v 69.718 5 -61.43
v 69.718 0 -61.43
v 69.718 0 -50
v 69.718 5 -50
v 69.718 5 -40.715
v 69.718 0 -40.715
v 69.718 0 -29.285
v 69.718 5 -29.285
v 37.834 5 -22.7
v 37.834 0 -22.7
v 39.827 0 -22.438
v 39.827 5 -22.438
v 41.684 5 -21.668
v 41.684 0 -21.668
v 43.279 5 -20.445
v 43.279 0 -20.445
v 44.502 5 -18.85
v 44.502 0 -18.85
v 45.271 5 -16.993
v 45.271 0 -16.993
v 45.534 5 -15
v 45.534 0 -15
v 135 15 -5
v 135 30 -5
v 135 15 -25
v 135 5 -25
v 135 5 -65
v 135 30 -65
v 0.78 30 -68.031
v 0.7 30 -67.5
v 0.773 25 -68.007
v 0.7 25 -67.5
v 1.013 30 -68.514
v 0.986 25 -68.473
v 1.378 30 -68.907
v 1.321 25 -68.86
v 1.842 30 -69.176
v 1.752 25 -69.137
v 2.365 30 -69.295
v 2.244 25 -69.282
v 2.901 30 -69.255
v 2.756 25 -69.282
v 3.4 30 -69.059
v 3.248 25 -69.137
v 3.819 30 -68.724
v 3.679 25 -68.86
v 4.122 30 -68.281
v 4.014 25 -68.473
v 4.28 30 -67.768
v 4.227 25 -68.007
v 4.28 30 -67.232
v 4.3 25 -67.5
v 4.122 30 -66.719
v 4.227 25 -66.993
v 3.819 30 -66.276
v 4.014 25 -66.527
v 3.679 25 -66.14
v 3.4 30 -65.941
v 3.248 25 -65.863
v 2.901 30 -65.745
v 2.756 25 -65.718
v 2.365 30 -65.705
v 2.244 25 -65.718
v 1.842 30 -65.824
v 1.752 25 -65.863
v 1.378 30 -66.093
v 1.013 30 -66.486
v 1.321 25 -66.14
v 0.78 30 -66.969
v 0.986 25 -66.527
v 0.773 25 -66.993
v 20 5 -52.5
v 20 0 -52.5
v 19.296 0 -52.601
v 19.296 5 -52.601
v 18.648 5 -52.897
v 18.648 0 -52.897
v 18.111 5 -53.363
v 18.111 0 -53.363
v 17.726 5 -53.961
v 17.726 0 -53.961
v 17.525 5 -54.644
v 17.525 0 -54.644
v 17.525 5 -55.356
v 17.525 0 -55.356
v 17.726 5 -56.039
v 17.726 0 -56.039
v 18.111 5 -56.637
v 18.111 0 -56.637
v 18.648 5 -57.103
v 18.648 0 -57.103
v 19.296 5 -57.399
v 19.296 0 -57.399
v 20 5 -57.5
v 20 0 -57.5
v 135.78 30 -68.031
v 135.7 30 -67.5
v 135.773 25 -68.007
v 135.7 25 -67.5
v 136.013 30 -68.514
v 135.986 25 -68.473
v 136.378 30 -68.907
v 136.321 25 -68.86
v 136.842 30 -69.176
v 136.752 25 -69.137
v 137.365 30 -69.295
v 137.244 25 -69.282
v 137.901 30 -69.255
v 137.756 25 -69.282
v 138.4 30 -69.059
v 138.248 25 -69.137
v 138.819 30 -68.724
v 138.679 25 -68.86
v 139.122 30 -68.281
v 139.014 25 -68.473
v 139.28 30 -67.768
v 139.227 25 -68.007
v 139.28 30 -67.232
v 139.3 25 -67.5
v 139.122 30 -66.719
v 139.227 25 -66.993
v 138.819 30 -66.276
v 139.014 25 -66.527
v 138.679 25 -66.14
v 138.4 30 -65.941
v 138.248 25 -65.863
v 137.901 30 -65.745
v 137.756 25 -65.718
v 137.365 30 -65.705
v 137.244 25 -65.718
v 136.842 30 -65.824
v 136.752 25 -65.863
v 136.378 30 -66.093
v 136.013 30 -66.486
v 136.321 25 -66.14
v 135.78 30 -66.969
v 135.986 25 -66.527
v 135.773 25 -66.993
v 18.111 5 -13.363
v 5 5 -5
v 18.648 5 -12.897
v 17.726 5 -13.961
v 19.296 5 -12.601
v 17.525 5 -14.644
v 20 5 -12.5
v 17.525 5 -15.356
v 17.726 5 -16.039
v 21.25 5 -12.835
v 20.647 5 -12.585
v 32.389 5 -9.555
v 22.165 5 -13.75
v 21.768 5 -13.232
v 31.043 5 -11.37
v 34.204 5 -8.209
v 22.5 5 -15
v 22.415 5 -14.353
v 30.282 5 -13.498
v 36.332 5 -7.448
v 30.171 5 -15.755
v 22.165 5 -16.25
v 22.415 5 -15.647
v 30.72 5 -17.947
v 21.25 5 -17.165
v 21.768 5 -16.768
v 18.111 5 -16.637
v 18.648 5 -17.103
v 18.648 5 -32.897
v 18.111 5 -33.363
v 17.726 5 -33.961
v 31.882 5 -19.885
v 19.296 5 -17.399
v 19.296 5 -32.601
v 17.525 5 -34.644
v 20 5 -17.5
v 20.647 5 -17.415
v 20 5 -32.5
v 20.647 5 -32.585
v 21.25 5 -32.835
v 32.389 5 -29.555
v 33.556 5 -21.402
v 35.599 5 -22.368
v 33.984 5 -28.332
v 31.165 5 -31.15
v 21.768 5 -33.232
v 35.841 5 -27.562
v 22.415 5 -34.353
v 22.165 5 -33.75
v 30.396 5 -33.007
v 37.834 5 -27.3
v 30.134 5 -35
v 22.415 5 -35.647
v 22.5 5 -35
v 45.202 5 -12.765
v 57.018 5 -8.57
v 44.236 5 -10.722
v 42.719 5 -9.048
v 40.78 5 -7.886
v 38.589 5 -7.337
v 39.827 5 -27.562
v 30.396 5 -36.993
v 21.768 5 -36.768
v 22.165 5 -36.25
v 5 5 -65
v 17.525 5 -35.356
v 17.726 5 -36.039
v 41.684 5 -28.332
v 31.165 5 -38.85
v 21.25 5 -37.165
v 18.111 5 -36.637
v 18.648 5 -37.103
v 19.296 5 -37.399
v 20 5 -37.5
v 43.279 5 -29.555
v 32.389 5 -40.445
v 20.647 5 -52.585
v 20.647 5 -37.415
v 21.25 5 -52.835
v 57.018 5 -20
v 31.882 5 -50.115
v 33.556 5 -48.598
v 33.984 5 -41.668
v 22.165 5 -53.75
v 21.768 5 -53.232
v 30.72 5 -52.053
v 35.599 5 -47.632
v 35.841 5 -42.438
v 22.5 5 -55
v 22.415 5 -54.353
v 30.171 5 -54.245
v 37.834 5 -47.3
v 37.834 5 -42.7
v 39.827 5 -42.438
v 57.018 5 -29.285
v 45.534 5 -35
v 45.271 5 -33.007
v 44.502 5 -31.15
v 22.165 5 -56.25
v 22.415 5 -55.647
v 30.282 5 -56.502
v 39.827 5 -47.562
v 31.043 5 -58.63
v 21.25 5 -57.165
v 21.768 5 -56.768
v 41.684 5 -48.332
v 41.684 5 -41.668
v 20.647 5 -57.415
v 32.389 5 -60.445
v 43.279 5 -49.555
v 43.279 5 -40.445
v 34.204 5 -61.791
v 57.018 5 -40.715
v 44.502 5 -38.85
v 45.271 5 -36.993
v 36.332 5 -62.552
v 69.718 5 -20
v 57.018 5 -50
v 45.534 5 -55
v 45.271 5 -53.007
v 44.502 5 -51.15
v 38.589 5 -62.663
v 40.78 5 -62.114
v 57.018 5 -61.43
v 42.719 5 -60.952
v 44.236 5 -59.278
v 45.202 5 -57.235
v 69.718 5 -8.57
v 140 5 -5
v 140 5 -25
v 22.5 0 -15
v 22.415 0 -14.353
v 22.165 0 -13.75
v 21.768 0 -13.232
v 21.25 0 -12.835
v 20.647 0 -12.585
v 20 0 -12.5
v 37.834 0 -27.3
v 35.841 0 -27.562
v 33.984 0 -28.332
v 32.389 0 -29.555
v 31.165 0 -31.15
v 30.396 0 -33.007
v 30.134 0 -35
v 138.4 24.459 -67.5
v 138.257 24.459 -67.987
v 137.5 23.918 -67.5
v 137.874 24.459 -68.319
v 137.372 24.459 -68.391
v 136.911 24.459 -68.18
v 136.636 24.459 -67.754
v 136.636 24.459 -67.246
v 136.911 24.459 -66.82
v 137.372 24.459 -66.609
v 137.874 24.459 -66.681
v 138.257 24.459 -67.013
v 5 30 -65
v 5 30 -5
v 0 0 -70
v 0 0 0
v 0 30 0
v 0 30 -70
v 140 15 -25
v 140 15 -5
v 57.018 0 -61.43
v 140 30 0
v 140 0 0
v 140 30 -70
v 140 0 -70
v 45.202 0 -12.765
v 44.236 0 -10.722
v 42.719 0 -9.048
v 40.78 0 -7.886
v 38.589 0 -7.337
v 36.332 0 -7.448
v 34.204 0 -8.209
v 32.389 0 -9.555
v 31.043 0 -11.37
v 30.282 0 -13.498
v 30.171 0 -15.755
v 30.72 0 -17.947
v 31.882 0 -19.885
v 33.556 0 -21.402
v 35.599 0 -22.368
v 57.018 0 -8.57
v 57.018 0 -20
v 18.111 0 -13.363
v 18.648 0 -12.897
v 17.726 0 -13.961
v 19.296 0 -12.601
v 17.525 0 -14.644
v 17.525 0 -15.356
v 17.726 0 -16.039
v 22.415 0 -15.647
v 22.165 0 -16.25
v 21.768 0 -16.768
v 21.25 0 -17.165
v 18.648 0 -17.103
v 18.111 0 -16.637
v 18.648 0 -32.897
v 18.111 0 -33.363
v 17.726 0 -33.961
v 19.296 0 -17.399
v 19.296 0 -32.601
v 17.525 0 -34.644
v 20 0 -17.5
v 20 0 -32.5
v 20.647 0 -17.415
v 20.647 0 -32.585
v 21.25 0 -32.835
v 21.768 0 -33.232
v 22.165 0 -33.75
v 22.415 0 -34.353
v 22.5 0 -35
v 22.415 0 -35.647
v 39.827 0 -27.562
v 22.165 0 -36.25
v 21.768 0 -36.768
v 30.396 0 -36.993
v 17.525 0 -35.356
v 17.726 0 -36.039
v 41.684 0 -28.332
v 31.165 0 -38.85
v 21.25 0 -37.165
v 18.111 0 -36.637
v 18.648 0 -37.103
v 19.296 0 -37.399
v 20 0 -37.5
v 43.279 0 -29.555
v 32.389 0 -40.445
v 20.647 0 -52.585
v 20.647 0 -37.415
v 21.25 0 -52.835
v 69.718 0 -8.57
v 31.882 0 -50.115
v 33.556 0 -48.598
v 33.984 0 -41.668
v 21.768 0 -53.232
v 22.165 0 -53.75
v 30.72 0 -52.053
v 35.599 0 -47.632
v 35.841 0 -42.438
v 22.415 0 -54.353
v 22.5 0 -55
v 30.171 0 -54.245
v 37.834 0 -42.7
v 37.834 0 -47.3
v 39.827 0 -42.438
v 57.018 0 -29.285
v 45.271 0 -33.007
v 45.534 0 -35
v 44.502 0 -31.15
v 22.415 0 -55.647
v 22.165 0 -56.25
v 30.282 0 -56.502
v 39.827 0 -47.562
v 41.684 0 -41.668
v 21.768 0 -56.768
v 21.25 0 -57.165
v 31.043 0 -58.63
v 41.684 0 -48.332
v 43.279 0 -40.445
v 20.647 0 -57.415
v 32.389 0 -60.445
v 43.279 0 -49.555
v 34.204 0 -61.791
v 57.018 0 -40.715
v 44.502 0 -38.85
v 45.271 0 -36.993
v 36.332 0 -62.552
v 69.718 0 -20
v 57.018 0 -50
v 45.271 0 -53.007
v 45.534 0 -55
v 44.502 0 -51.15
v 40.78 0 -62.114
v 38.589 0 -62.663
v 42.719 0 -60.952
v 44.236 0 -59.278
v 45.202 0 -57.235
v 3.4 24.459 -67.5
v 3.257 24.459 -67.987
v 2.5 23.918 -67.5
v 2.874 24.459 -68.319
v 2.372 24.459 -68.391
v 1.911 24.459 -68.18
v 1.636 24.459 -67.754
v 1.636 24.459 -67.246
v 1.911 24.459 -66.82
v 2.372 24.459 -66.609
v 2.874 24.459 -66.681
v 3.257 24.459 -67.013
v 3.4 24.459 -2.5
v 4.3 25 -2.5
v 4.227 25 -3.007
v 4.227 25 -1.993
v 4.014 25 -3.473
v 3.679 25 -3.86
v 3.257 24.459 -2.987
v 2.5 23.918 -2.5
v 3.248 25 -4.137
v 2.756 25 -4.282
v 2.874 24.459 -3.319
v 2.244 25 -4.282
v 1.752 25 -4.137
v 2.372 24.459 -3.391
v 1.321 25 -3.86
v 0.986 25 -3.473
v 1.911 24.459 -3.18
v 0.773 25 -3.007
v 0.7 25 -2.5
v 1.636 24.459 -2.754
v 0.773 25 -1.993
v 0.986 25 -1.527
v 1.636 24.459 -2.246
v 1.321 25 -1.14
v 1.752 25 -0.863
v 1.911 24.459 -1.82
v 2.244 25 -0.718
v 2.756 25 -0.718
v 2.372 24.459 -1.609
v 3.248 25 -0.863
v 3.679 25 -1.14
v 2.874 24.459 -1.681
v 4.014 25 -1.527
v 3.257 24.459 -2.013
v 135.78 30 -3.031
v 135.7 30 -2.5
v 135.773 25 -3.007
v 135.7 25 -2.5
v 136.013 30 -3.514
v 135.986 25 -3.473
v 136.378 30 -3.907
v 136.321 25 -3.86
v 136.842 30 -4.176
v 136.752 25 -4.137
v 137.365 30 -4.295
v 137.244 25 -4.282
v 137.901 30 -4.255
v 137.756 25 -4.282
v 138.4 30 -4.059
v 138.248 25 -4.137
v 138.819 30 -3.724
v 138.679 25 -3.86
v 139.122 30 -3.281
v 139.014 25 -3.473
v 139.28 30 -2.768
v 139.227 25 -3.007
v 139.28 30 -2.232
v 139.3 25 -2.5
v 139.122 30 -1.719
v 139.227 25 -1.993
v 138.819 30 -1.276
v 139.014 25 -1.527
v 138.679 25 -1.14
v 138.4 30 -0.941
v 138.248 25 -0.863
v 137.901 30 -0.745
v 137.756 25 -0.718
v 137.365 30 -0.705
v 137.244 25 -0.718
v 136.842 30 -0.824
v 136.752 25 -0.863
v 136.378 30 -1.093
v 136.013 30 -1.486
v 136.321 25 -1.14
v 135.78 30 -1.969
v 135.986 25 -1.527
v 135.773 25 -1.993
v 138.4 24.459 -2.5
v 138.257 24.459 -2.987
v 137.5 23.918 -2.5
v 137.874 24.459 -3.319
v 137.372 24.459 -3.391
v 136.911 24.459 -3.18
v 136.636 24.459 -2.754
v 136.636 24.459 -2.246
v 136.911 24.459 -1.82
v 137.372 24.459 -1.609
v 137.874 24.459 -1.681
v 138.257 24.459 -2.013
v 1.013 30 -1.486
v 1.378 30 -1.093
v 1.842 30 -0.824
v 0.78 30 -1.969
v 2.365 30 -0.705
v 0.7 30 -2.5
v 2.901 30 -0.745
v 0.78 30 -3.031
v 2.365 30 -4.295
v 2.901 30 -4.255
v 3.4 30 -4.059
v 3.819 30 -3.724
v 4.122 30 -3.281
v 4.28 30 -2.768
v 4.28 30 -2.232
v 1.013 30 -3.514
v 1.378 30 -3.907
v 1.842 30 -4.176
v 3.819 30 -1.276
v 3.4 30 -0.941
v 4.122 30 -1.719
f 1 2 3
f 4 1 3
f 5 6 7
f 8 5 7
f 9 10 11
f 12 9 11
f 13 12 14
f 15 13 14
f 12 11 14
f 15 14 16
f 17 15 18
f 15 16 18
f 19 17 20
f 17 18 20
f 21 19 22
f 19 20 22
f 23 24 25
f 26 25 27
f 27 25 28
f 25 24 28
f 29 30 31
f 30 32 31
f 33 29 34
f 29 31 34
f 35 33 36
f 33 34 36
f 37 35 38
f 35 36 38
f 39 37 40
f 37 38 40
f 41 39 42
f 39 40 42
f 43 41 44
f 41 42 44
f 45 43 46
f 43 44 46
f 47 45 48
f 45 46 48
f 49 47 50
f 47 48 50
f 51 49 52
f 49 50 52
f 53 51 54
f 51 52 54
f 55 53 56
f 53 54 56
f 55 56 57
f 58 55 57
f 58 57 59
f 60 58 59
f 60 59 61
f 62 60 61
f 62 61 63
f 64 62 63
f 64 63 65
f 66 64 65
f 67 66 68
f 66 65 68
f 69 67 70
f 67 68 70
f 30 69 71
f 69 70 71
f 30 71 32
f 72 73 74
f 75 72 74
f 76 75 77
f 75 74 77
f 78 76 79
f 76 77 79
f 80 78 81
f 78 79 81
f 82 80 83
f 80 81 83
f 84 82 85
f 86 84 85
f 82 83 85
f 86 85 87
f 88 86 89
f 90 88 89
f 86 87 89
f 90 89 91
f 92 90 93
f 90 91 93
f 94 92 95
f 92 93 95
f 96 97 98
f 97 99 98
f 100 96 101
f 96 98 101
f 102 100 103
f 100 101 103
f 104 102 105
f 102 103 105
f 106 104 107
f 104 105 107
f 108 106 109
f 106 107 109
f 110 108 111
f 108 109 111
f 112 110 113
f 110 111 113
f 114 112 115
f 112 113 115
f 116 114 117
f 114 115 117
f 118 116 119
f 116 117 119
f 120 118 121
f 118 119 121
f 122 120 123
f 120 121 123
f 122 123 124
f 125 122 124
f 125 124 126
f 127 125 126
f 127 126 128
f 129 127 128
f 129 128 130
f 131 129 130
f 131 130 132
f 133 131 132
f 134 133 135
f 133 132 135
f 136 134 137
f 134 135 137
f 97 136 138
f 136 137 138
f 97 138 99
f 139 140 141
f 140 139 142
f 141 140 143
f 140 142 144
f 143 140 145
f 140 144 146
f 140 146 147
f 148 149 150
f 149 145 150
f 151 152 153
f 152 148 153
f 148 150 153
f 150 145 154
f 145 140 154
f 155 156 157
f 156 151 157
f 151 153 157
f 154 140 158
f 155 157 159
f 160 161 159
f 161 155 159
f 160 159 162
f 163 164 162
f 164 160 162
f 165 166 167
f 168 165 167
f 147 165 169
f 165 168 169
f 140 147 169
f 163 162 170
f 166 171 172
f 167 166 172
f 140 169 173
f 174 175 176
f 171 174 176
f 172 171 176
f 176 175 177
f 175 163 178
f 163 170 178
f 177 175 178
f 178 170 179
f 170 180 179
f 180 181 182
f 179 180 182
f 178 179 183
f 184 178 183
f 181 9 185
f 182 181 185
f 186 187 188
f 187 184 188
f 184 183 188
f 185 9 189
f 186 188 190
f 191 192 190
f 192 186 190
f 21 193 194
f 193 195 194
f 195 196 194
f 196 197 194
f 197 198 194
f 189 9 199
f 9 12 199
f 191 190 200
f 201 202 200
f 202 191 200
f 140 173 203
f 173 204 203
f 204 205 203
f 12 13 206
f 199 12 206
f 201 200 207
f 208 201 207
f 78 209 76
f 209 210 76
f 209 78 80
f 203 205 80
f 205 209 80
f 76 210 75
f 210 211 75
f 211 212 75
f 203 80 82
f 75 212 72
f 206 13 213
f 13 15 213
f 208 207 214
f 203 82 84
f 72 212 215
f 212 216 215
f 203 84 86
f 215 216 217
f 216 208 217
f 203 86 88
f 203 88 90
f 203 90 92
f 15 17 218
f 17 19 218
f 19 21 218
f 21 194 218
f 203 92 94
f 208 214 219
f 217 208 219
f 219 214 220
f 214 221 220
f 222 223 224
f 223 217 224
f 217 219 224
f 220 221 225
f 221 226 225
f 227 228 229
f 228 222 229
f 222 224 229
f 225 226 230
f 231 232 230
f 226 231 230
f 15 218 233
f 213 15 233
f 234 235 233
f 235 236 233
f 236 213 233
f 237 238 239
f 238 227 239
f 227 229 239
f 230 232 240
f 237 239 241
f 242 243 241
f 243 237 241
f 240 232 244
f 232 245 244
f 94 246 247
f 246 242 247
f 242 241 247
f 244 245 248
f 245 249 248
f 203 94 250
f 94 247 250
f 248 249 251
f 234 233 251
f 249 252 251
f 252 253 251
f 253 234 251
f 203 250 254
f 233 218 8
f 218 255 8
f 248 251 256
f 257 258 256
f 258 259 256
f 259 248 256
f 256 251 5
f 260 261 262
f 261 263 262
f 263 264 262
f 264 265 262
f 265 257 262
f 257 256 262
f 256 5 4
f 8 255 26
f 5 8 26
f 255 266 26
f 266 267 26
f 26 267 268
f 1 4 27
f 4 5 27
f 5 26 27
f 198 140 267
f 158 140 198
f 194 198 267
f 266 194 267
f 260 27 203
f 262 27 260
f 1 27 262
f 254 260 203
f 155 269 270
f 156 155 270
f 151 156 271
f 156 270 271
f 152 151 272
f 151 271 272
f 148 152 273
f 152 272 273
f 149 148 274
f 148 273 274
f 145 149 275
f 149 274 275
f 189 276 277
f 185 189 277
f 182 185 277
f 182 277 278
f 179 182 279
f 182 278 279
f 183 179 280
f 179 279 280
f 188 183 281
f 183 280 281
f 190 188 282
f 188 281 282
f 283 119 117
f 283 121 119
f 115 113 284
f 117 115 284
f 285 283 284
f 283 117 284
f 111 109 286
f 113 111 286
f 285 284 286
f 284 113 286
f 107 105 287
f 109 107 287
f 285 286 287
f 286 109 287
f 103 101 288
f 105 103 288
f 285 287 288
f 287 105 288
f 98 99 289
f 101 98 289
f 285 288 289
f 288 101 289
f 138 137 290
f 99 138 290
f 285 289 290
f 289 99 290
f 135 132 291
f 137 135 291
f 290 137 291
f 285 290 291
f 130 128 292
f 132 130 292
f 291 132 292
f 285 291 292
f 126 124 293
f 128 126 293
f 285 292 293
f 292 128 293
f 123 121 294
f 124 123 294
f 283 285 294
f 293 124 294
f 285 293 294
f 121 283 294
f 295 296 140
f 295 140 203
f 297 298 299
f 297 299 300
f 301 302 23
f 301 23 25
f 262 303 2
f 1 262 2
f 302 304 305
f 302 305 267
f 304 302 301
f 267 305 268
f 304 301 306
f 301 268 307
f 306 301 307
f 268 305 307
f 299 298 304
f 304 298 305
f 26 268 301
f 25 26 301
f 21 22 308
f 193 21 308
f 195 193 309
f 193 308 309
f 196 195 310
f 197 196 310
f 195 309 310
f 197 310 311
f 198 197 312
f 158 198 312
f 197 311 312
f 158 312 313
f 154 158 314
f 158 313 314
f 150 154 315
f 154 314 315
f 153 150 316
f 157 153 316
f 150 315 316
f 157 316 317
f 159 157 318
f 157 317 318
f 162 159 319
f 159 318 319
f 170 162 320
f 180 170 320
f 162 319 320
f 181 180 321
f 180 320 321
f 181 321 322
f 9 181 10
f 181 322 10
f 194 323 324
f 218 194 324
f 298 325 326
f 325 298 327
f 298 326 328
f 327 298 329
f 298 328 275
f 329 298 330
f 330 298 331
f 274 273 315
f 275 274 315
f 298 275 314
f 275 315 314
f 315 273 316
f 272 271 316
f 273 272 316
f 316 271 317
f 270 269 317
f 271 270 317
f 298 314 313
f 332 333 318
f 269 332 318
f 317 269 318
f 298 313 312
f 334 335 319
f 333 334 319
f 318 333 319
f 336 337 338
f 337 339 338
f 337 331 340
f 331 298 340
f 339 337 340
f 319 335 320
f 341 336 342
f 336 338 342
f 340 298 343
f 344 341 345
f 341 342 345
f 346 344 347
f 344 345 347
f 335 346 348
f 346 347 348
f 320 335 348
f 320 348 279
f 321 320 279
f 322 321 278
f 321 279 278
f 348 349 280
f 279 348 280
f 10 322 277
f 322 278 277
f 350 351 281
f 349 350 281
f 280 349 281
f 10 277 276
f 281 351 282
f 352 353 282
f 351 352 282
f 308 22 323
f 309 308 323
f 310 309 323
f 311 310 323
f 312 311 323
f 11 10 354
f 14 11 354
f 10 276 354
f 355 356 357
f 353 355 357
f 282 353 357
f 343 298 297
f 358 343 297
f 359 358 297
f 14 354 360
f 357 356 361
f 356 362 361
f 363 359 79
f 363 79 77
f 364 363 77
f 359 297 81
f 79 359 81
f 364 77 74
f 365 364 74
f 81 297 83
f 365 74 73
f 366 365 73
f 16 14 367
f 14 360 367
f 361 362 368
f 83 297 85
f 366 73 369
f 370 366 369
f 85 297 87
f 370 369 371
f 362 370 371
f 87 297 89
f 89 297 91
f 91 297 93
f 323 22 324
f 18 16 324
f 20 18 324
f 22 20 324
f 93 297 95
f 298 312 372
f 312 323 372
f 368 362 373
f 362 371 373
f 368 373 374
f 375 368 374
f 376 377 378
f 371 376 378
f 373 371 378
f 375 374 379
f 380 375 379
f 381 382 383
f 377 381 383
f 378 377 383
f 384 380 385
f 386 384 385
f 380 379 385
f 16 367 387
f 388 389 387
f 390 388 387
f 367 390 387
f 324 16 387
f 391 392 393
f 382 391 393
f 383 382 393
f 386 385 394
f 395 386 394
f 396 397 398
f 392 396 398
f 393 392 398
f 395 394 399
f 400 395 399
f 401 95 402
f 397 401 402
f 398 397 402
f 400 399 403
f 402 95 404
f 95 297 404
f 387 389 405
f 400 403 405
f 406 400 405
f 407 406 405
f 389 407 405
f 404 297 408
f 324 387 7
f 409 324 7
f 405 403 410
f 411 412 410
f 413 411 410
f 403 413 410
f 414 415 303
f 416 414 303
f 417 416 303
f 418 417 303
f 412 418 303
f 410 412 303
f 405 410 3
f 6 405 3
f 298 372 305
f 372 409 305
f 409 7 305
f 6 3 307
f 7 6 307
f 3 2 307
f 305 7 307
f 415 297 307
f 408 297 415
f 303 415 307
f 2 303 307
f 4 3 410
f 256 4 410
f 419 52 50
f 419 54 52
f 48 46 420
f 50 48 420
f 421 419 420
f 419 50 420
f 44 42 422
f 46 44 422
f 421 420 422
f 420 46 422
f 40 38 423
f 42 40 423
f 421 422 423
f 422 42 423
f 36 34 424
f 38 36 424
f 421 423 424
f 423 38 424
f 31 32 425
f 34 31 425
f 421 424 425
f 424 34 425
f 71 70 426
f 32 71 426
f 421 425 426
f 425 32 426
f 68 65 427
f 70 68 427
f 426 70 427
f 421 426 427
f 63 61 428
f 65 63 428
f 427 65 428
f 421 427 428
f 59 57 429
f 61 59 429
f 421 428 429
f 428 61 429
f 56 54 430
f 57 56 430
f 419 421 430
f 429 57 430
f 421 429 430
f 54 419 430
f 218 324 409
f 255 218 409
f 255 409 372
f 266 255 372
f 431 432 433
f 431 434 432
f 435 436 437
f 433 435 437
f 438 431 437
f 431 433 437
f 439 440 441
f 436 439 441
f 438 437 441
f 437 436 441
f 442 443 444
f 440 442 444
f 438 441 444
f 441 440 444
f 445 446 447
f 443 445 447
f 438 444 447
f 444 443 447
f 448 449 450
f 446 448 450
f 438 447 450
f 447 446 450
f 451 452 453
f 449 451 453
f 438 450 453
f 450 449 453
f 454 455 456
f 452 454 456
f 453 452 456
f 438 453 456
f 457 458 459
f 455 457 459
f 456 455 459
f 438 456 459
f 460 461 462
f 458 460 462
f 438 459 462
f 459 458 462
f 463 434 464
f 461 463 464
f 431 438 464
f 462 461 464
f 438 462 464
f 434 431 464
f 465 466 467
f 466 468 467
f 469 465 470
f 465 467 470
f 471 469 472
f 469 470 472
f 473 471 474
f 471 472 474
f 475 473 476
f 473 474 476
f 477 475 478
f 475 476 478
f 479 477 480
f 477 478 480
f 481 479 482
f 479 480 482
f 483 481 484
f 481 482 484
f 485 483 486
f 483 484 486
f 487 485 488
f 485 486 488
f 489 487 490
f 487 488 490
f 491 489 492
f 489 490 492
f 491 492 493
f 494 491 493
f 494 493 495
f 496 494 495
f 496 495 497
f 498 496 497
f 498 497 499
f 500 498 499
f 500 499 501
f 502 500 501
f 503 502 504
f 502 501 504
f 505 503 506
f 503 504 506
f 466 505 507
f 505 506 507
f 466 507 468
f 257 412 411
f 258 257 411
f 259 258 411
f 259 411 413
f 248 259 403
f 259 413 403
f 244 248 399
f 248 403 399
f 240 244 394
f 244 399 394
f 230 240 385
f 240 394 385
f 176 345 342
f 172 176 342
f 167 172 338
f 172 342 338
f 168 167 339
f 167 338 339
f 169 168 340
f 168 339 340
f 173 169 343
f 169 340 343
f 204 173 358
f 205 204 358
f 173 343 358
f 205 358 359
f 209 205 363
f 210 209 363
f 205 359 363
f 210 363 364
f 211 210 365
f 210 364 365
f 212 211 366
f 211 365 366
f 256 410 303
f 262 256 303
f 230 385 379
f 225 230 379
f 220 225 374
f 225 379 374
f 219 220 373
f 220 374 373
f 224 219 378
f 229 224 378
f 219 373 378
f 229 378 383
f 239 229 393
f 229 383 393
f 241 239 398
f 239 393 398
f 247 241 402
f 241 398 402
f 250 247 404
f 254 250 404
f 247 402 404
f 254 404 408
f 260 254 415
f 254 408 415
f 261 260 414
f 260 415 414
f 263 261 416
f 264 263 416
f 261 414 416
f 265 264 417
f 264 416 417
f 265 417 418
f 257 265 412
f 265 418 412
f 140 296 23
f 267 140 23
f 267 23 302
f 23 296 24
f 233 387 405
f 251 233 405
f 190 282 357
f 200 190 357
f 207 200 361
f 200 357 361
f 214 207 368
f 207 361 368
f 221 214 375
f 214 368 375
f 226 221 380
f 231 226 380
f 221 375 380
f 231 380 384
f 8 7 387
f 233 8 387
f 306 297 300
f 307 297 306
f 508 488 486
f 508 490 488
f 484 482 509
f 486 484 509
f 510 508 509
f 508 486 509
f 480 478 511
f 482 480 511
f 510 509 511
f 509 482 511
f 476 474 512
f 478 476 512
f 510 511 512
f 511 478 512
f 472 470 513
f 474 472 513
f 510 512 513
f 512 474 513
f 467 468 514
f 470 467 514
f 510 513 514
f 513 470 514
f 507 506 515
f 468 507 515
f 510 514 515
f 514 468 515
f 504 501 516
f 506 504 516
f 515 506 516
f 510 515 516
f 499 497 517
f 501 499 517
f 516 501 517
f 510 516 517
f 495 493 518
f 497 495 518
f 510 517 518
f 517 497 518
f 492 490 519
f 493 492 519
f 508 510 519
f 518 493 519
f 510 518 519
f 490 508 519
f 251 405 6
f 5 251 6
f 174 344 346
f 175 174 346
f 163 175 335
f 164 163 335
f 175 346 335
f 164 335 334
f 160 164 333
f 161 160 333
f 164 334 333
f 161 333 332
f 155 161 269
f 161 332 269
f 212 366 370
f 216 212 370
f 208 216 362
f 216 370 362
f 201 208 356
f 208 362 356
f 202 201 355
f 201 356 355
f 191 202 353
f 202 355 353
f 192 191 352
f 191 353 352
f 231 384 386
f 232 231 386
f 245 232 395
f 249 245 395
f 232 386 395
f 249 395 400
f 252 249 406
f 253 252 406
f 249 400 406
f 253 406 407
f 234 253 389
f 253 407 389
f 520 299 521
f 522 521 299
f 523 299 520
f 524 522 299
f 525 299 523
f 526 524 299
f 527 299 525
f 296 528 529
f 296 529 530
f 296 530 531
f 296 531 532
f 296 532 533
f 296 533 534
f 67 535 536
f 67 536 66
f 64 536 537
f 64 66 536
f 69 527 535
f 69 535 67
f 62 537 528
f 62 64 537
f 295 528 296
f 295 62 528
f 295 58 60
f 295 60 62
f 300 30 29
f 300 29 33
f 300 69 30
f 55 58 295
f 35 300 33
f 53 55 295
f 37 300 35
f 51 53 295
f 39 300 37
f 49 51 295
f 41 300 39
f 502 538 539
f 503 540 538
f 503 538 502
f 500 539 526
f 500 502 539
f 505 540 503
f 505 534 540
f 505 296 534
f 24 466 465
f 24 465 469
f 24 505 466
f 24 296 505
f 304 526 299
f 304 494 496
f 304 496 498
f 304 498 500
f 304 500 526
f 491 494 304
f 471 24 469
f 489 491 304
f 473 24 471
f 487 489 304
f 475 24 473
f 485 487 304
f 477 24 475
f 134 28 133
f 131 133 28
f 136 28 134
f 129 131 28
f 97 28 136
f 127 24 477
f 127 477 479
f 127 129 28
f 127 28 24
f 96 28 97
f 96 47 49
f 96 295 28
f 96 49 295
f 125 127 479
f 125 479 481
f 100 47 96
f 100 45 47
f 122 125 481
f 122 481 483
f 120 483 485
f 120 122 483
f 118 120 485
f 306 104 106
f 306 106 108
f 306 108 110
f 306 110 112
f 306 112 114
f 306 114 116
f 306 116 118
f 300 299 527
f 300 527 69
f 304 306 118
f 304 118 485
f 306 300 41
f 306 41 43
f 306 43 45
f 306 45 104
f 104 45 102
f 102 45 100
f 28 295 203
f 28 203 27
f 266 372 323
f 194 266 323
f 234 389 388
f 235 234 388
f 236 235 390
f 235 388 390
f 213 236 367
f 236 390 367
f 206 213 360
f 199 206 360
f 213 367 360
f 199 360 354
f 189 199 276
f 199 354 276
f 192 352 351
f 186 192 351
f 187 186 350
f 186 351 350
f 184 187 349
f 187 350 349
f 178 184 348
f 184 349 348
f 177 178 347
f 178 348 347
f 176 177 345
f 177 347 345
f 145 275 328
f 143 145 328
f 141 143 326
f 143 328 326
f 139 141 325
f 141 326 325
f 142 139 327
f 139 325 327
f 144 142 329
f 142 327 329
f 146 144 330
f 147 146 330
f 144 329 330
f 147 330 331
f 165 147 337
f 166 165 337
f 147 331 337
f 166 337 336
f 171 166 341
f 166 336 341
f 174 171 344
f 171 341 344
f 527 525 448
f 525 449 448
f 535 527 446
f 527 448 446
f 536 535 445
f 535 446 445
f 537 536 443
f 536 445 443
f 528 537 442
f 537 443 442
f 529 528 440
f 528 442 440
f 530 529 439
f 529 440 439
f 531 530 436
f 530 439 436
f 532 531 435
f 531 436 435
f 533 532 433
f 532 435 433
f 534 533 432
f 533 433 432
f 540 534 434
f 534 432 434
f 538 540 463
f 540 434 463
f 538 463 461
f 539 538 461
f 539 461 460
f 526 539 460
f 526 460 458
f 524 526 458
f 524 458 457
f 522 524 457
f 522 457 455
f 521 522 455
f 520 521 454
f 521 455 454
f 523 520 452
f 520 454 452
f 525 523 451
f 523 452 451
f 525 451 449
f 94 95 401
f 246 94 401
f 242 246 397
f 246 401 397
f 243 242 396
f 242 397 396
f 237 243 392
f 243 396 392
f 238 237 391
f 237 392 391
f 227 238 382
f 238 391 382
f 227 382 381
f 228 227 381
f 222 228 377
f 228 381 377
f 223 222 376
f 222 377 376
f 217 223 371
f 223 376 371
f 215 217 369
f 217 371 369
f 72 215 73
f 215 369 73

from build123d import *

# Parameters (mm, degrees)
SKETCH1_W                = 140
SKETCH1_H                = 70
BOSS_EXTRUDE1_DEPTH      = 30
SKETCH2_W                = 130
SKETCH2_H                = 60
CUT_EXTRUDE1_DEPTH       = 25
SKETCH3_W                = 5
SKETCH3_H                = 5.715
CUT_EXTRUDE2_DEPTH       = 25
SKETCH4_W                = 20
SKETCH4_H                = 10
CUT_EXTRUDE6_DEPTH       = 25
M3_CLEARANCE_HOLE1_D     = 3.6
M3_CLEARANCE_HOLE1_DEPTH = 5
M3_CLEARANCE_HOLE1_TIP   = 1.081549114


with BuildPart() as part:
    # Sketch1 → Boss-Extrude1 (new body)
    with BuildSketch(Plane(origin=(0, 0, 0), x_dir=(1, 0, 0), z_dir=(0, 1, 0))):
        with Locations((70, 35)):
            Rectangle(SKETCH1_W, SKETCH1_H)
    extrude(amount=BOSS_EXTRUDE1_DEPTH)

    # Sketch2 → Cut-Extrude1 (cut)
    with BuildSketch(Plane(origin=(0, 30, 0), x_dir=(1, 0, 0), z_dir=(0, 1, 0))):
        with Locations((70, 35)):
            Rectangle(SKETCH2_W, SKETCH2_H)
    extrude(amount=-CUT_EXTRUDE1_DEPTH, mode=Mode.SUBTRACT)

    # Sketch3 → Cut-Extrude2 (cut)
    with BuildSketch(Plane.XZ):
        with BuildLine():
            ThreePointArc((22.5, -15), (21.767766953, -13.232233047), (20, -12.5))
            Line((20, -12.5), (20, -15))
            Line((20, -15), (20, -17.5))
            ThreePointArc((20, -17.5), (21.767766953, -16.767766953), (22.5, -15))
        make_face()
        with BuildLine():
            ThreePointArc((45.533822472, -15), (32.389100257, -9.555277785), (37.833822472, -22.7))
            ThreePointArc((37.833822472, -22.7), (43.278544687, -20.444722215), (45.533822472, -15))
        make_face()
        Polygon((57.017644944, -20), (62.017644944, -20), (69.717644944, -20), (69.717644944, -8.57), (57.017644944, -8.57), (57.017644944, -15), align=None)
        Polygon((69.717644944, -50), (62.017644944, -50), (57.017644944, -50), (57.017644944, -61.43), (69.717644944, -61.43), align=None)
        with Locations((59.517644944, -32.1425)):
            Rectangle(SKETCH3_W, SKETCH3_H)
        with Locations((59.517644944, -37.8575)):
            Rectangle(SKETCH3_W, SKETCH3_H)
        with BuildLine():
            ThreePointArc((45.533822472, -55), (43.278544687, -49.555277785), (37.833822472, -47.3))
            ThreePointArc((37.833822472, -47.3), (32.389100257, -60.444722215), (45.533822472, -55))
        make_face()
        with BuildLine():
            ThreePointArc((37.833822472, -27.3), (32.389100257, -29.555277785), (30.133822472, -35))
            Line((30.133822472, -35), (37.833822472, -35))
            Line((37.833822472, -35), (37.833822472, -27.3))
        make_face()
        with BuildLine():
            Line((37.833822472, -35), (30.133822472, -35))
            ThreePointArc((30.133822472, -35), (32.389100257, -40.444722215), (37.833822472, -42.7))
            Line((37.833822472, -42.7), (37.833822472, -35))
        make_face()
        with BuildLine():
            ThreePointArc((22.5, -55), (21.767766953, -53.232233047), (20, -52.5))
            Line((20, -52.5), (20, -57.5))
            ThreePointArc((20, -57.5), (21.767766953, -56.767766953), (22.5, -55))
        make_face()
        with BuildLine():
            Line((20, -57.5), (20, -52.5))
            ThreePointArc((20, -52.5), (17.5, -55), (20, -57.5))
        make_face()
        with BuildLine():
            ThreePointArc((22.5, -35), (21.767766953, -33.232233047), (20, -32.5))
            Line((20, -32.5), (20, -35))
            Line((20, -35), (22.5, -35))
        make_face()
        with BuildLine():
            Line((20, -35), (20, -32.5))
            ThreePointArc((20, -32.5), (17.5, -35), (20, -37.5))
            Line((20, -37.5), (20, -35))
        make_face()
        with BuildLine():
            Line((20, -15), (20, -12.5))
            ThreePointArc((20, -12.5), (17.5, -15), (20, -17.5))
            Line((20, -17.5), (20, -15))
        make_face()
        with BuildLine():
            Line((22.5, -35), (20, -35))
            Line((20, -35), (20, -37.5))
            ThreePointArc((20, -37.5), (21.767766953, -36.767766953), (22.5, -35))
        make_face()
        with BuildLine():
            Line((37.833822472, -27.3), (37.833822472, -35))
            Line((37.833822472, -35), (45.533822472, -35))
            ThreePointArc((45.533822472, -35), (43.278544687, -29.555277785), (37.833822472, -27.3))
        make_face()
        with BuildLine():
            Line((45.533822472, -35), (37.833822472, -35))
            Line((37.833822472, -35), (37.833822472, -42.7))
            ThreePointArc((37.833822472, -42.7), (43.278544687, -40.444722215), (45.533822472, -35))
        make_face()
        Polygon((62.017644944, -29.285), (62.017644944, -35), (62.017644944, -40.715), (68.367644944, -40.715), (69.717644944, -40.715), (69.717644944, -29.285), (68.367644944, -29.285), align=None)
    extrude(amount=-CUT_EXTRUDE2_DEPTH, mode=Mode.SUBTRACT)

    # Sketch4 → Cut-Extrude6 (cut)
    with BuildSketch(Plane(origin=(140, 0, 0), x_dir=(0, 0, -1), z_dir=(1, 0, 0))):
        with Locations((15, 10)):
            Rectangle(SKETCH4_W, SKETCH4_H)
    extrude(amount=-CUT_EXTRUDE6_DEPTH, mode=Mode.SUBTRACT)

    # M3 Clearance Hole1
    with Locations(Plane(origin=(0, 30, 0), x_dir=(1, 0, 0), z_dir=(0, 1, 0))):
        with Locations((2.5, 2.5), (2.5, 67.5), (137.5, 67.5), (137.5, 2.5)):
            Hole(M3_CLEARANCE_HOLE1_D / 2, depth=M3_CLEARANCE_HOLE1_DEPTH)
            with Locations((0, 0, -(M3_CLEARANCE_HOLE1_DEPTH + M3_CLEARANCE_HOLE1_TIP / 2))):  # 118° drill point
                Cone(0, M3_CLEARANCE_HOLE1_D / 2, M3_CLEARANCE_HOLE1_TIP, mode=Mode.SUBTRACT)


solid = part.part
